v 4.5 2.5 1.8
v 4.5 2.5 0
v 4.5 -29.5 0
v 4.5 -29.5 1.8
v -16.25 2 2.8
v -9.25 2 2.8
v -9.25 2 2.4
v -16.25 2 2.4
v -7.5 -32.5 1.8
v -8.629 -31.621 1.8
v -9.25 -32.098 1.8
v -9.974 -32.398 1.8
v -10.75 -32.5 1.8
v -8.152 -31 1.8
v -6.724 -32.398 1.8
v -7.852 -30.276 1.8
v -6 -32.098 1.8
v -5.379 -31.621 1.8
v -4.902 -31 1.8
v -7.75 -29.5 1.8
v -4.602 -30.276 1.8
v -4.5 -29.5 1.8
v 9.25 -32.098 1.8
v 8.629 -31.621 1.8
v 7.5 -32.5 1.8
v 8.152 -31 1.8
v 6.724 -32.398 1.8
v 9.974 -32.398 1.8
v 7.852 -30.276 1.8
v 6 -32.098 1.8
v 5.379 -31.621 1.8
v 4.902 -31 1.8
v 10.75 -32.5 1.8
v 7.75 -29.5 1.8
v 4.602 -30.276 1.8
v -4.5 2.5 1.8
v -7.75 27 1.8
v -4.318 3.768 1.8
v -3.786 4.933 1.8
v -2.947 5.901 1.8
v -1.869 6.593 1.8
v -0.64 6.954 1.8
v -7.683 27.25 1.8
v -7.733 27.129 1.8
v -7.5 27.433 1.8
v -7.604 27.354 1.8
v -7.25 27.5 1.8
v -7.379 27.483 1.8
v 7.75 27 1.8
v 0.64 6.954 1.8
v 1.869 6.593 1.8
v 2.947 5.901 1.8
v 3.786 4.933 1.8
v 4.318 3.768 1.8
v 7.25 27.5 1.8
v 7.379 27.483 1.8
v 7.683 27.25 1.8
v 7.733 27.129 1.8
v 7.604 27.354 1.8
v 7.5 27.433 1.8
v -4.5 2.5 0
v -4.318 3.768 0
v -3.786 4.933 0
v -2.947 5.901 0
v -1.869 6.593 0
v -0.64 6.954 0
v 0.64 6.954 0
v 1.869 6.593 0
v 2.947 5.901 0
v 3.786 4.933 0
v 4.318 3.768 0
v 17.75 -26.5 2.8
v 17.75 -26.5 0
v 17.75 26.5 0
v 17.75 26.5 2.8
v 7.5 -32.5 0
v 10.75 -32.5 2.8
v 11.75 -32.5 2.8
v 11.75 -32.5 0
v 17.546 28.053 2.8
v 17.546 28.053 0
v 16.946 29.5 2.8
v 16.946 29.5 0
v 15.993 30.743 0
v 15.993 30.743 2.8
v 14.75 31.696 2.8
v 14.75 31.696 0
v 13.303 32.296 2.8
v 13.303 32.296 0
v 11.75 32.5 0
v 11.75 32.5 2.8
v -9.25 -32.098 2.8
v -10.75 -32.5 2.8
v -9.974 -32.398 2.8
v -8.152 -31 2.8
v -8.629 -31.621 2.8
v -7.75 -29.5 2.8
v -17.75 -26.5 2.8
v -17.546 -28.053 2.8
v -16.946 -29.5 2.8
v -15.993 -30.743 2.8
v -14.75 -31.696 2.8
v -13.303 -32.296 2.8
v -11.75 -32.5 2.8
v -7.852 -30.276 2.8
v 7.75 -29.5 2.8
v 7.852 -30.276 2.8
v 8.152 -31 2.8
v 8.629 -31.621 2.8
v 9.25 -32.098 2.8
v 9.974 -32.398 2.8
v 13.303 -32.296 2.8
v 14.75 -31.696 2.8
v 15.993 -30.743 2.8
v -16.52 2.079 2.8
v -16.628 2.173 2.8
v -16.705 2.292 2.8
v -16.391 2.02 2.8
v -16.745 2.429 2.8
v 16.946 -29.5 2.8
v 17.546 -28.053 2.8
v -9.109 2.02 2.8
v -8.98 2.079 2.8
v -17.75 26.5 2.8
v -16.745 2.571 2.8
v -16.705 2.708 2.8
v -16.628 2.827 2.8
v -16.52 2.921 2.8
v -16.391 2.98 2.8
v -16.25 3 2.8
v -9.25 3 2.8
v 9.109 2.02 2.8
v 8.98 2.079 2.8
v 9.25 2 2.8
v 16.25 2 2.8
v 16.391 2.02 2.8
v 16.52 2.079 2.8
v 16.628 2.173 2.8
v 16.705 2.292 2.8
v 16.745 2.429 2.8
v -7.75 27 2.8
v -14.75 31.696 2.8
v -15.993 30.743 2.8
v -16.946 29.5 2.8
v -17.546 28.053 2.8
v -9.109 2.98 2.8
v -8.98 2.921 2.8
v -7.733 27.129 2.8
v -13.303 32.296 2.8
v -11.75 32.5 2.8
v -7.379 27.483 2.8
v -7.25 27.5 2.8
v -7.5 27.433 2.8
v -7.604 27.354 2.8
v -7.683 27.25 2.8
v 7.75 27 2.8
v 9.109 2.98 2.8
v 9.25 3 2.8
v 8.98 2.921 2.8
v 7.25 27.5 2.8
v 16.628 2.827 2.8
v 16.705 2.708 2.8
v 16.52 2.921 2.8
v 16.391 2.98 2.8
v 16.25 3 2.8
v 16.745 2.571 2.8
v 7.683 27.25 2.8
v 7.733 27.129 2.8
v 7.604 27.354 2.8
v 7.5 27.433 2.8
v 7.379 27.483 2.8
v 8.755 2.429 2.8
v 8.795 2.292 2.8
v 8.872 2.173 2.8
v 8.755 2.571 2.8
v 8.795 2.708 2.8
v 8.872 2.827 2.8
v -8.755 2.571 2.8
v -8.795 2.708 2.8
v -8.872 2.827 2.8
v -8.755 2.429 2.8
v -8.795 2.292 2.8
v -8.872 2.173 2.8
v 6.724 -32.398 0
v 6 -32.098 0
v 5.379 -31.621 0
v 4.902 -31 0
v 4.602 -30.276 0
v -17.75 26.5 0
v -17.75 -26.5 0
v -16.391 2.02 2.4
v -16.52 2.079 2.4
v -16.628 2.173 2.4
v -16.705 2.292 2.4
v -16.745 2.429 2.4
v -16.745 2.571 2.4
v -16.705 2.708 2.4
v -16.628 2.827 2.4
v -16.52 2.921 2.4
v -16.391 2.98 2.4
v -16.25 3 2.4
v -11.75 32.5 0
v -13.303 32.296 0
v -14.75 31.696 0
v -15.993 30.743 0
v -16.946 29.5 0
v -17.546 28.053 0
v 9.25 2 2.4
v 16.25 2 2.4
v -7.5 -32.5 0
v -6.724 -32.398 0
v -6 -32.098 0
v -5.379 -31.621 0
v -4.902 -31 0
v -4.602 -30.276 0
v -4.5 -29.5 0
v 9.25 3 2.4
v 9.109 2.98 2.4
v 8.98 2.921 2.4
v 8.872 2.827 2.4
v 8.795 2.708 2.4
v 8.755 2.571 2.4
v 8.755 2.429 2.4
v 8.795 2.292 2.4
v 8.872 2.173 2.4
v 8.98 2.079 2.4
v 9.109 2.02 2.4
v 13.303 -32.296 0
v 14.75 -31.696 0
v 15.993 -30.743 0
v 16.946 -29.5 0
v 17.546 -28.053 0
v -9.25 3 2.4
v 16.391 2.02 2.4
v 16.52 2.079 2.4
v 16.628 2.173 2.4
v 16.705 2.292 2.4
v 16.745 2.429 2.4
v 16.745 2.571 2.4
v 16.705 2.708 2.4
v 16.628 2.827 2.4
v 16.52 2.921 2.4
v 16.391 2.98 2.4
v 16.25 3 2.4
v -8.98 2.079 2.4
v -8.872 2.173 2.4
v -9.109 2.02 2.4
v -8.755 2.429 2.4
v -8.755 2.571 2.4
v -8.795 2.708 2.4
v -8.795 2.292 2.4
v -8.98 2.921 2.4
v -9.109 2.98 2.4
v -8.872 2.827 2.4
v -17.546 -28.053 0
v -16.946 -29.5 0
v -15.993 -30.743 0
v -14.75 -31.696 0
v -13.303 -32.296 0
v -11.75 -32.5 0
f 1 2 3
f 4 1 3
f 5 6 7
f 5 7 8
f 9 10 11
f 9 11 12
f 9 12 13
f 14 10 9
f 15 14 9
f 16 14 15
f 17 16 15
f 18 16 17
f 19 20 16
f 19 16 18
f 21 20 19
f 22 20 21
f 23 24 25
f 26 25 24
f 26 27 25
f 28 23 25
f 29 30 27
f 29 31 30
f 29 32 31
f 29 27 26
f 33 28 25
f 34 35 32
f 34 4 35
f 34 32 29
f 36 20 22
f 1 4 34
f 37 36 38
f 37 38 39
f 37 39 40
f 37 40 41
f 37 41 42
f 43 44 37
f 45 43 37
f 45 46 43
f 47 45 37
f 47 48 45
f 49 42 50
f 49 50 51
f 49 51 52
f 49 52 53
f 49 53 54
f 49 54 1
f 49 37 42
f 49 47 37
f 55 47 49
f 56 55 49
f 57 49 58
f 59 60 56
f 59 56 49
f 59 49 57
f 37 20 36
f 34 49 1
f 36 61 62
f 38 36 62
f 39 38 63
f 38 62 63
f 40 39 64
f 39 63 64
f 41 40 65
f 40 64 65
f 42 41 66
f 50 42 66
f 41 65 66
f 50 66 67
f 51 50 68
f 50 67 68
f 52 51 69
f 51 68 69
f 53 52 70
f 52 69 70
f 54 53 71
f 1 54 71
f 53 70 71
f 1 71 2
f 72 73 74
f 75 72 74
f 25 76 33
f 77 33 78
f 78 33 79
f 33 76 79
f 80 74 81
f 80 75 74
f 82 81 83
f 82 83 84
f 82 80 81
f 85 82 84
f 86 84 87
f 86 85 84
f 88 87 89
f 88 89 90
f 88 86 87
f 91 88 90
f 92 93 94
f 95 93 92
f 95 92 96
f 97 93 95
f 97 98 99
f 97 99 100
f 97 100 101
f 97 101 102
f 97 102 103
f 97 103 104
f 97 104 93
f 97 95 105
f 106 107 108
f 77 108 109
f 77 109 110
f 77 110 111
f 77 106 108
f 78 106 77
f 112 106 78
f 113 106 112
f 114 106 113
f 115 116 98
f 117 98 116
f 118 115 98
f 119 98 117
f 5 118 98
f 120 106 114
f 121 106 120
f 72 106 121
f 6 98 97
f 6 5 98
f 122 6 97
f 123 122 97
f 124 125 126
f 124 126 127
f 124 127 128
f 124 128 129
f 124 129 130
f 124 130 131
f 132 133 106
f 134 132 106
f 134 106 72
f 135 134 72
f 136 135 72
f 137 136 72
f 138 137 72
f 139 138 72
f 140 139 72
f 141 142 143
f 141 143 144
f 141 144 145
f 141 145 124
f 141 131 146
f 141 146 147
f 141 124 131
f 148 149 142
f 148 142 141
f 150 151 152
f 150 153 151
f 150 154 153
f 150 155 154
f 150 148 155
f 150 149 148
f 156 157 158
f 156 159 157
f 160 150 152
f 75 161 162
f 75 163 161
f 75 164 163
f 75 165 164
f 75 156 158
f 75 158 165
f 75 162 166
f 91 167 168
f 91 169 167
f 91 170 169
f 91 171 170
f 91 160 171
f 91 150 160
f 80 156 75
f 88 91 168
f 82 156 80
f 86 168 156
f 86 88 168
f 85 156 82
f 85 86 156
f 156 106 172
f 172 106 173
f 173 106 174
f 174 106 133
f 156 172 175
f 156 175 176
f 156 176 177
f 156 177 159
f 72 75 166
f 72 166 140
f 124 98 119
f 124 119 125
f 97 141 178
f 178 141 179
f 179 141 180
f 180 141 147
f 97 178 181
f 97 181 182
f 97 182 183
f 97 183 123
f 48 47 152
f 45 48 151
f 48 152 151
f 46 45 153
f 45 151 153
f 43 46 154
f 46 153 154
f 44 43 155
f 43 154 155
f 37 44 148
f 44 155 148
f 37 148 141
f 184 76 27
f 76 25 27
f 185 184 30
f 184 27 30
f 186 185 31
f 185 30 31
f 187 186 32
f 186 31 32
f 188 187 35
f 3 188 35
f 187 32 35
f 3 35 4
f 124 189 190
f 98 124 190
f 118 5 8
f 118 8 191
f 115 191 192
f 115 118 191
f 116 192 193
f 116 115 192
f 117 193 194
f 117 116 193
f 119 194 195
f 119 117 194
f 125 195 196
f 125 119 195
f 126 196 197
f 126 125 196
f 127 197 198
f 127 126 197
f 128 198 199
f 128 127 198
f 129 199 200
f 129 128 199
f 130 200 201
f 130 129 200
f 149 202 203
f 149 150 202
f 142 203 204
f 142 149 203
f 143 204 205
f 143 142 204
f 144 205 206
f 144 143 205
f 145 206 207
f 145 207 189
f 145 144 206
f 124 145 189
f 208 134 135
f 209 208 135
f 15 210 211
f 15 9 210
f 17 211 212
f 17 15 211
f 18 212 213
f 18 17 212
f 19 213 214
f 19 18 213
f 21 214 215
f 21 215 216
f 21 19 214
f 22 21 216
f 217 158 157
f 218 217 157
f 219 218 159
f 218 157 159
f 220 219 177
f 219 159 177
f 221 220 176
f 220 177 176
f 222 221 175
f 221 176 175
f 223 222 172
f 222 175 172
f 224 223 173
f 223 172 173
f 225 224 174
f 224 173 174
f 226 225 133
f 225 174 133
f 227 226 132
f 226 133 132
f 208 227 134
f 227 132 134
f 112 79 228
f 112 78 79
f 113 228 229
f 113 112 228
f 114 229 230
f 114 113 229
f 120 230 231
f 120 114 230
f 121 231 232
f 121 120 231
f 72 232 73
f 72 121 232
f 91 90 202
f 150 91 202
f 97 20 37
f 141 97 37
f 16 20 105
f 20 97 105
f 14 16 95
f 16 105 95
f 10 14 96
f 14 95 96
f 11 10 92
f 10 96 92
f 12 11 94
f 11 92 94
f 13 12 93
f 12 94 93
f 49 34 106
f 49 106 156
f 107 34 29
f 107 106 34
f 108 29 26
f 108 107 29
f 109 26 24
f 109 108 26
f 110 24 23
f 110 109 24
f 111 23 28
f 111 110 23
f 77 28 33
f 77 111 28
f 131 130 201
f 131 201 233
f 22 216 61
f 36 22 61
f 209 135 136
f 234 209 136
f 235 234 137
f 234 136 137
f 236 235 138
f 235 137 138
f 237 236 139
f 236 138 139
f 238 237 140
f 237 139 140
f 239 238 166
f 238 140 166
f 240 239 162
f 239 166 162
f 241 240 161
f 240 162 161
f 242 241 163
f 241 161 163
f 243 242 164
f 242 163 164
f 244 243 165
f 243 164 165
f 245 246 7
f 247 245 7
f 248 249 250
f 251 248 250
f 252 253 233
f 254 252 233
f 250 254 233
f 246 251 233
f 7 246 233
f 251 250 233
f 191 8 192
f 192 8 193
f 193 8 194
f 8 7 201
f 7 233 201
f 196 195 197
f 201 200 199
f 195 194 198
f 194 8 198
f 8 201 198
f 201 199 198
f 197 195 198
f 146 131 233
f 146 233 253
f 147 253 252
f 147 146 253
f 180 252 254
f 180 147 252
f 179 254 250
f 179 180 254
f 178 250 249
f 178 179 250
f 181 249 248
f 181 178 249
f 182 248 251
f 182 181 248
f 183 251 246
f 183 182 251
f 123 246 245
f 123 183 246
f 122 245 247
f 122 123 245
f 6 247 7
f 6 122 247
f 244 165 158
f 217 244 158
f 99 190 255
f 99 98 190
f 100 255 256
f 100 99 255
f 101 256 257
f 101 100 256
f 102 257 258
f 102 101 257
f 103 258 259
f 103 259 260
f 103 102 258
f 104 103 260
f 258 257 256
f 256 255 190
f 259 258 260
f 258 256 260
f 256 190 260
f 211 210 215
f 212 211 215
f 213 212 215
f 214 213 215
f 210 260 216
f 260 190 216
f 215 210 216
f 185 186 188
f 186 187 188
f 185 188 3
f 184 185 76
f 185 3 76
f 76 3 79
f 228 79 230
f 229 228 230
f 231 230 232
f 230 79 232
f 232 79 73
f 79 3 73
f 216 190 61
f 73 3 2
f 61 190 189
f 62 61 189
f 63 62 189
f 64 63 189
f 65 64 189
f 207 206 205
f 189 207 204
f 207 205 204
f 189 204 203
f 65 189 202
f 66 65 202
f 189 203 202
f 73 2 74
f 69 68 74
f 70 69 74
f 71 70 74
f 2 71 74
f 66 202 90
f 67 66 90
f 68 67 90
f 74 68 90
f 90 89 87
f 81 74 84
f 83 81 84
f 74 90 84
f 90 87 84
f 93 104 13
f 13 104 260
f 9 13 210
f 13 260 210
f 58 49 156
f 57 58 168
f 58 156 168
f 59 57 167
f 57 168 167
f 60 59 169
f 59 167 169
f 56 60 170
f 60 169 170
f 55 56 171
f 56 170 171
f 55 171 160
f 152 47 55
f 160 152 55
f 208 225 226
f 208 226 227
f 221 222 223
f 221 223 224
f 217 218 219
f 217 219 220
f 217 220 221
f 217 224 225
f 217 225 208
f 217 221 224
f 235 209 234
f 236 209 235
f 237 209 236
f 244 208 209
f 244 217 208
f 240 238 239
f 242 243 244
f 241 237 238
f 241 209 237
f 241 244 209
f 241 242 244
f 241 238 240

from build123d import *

# Parameters (mm, degrees)
F3_DEPTH = 2.8
F4_W     = 15.5
F4_H     = 60
F5_DEPTH = 25
F7_DEPTH = 0.4
F8_R     = 6
F9_R     = 0.5
F10_R    = 3


# Not quite as in the source:
# - a pattern or mirror of a feature is missing from the dataset's text; its kind, count and spacing are read off the source's solid


with BuildPart() as f3:
    # F2 (on Top) → F3 (new body)
    with BuildSketch(Plane.XY):
        with BuildLine():
            Line((4.5, -32.5), (17.75, -32.5))
            Line((17.75, -32.5), (17.75, 32.5))
            Line((17.75, 32.5), (-17.75, 32.5))
            Line((-17.75, 32.5), (-17.75, -32.5))
            Line((-17.75, -32.5), (-4.5, -32.5))
            Line((-4.5, -32.5), (-4.5, 2.5))
            ThreePointArc((-4.5, 2.5), (0, 7), (4.5, 2.5))
            Line((4.5, 2.5), (4.5, -32.5))
        make_face()
    extrude(amount=F3_DEPTH)

    # F4 (on offset) → F5 (cut)
    with BuildSketch(Plane.XY.offset(1.8)):
        with Locations((0, -2.5)):
            Rectangle(F4_W, F4_H)
    extrude(amount=F5_DEPTH, mode=Mode.SUBTRACT)

    # F6 (on face) → F7 (cut)
    with BuildSketch(Plane.XY.offset(2.8)):
        with BuildLine():
            Line((9.25, 2), (16.25, 2))
            ThreePointArc((16.25, 2), (16.75, 2.5), (16.25, 3))
            Line((16.25, 3), (9.25, 3))
            ThreePointArc((9.25, 3), (8.75, 2.5), (9.25, 2))
        make_face()
    f7 = extrude(amount=-F7_DEPTH, mode=Mode.SUBTRACT)

    # F7_copies: F7 across plane
    add(f7.mirror(Plane(origin=(0, 0, 0), x_dir=(0, 0, -1), z_dir=(-1, 0, 0))), mode=Mode.SUBTRACT)

    # F8
    f8_edges = [f3.edges().sort_by_distance(p)[0] for p in [
        (-17.75, -32.5, 1.4),
        (17.75, -32.5, 1.4),
        (-17.75, 32.5, 1.4),
        (17.75, 32.5, 1.4),
    ]]
    fillet(f8_edges, radius=F8_R)

    # F9
    f9_edges = [f3.edges().sort_by_distance(p)[0] for p in [
        (7.75, 27.5, 2.3),
        (-7.75, 27.5, 2.3),
    ]]
    fillet(f9_edges, radius=F9_R)

    # F10
    f10_edges = [f3.edges().sort_by_distance(p)[0] for p in [
        (7.75, -32.5, 2.3),
        (-7.75, -32.5, 2.3),
        (-4.5, -32.5, 0.9),
        (4.5, -32.5, 0.9),
    ]]
    fillet(f10_edges, radius=F10_R)


solid = f3.part
